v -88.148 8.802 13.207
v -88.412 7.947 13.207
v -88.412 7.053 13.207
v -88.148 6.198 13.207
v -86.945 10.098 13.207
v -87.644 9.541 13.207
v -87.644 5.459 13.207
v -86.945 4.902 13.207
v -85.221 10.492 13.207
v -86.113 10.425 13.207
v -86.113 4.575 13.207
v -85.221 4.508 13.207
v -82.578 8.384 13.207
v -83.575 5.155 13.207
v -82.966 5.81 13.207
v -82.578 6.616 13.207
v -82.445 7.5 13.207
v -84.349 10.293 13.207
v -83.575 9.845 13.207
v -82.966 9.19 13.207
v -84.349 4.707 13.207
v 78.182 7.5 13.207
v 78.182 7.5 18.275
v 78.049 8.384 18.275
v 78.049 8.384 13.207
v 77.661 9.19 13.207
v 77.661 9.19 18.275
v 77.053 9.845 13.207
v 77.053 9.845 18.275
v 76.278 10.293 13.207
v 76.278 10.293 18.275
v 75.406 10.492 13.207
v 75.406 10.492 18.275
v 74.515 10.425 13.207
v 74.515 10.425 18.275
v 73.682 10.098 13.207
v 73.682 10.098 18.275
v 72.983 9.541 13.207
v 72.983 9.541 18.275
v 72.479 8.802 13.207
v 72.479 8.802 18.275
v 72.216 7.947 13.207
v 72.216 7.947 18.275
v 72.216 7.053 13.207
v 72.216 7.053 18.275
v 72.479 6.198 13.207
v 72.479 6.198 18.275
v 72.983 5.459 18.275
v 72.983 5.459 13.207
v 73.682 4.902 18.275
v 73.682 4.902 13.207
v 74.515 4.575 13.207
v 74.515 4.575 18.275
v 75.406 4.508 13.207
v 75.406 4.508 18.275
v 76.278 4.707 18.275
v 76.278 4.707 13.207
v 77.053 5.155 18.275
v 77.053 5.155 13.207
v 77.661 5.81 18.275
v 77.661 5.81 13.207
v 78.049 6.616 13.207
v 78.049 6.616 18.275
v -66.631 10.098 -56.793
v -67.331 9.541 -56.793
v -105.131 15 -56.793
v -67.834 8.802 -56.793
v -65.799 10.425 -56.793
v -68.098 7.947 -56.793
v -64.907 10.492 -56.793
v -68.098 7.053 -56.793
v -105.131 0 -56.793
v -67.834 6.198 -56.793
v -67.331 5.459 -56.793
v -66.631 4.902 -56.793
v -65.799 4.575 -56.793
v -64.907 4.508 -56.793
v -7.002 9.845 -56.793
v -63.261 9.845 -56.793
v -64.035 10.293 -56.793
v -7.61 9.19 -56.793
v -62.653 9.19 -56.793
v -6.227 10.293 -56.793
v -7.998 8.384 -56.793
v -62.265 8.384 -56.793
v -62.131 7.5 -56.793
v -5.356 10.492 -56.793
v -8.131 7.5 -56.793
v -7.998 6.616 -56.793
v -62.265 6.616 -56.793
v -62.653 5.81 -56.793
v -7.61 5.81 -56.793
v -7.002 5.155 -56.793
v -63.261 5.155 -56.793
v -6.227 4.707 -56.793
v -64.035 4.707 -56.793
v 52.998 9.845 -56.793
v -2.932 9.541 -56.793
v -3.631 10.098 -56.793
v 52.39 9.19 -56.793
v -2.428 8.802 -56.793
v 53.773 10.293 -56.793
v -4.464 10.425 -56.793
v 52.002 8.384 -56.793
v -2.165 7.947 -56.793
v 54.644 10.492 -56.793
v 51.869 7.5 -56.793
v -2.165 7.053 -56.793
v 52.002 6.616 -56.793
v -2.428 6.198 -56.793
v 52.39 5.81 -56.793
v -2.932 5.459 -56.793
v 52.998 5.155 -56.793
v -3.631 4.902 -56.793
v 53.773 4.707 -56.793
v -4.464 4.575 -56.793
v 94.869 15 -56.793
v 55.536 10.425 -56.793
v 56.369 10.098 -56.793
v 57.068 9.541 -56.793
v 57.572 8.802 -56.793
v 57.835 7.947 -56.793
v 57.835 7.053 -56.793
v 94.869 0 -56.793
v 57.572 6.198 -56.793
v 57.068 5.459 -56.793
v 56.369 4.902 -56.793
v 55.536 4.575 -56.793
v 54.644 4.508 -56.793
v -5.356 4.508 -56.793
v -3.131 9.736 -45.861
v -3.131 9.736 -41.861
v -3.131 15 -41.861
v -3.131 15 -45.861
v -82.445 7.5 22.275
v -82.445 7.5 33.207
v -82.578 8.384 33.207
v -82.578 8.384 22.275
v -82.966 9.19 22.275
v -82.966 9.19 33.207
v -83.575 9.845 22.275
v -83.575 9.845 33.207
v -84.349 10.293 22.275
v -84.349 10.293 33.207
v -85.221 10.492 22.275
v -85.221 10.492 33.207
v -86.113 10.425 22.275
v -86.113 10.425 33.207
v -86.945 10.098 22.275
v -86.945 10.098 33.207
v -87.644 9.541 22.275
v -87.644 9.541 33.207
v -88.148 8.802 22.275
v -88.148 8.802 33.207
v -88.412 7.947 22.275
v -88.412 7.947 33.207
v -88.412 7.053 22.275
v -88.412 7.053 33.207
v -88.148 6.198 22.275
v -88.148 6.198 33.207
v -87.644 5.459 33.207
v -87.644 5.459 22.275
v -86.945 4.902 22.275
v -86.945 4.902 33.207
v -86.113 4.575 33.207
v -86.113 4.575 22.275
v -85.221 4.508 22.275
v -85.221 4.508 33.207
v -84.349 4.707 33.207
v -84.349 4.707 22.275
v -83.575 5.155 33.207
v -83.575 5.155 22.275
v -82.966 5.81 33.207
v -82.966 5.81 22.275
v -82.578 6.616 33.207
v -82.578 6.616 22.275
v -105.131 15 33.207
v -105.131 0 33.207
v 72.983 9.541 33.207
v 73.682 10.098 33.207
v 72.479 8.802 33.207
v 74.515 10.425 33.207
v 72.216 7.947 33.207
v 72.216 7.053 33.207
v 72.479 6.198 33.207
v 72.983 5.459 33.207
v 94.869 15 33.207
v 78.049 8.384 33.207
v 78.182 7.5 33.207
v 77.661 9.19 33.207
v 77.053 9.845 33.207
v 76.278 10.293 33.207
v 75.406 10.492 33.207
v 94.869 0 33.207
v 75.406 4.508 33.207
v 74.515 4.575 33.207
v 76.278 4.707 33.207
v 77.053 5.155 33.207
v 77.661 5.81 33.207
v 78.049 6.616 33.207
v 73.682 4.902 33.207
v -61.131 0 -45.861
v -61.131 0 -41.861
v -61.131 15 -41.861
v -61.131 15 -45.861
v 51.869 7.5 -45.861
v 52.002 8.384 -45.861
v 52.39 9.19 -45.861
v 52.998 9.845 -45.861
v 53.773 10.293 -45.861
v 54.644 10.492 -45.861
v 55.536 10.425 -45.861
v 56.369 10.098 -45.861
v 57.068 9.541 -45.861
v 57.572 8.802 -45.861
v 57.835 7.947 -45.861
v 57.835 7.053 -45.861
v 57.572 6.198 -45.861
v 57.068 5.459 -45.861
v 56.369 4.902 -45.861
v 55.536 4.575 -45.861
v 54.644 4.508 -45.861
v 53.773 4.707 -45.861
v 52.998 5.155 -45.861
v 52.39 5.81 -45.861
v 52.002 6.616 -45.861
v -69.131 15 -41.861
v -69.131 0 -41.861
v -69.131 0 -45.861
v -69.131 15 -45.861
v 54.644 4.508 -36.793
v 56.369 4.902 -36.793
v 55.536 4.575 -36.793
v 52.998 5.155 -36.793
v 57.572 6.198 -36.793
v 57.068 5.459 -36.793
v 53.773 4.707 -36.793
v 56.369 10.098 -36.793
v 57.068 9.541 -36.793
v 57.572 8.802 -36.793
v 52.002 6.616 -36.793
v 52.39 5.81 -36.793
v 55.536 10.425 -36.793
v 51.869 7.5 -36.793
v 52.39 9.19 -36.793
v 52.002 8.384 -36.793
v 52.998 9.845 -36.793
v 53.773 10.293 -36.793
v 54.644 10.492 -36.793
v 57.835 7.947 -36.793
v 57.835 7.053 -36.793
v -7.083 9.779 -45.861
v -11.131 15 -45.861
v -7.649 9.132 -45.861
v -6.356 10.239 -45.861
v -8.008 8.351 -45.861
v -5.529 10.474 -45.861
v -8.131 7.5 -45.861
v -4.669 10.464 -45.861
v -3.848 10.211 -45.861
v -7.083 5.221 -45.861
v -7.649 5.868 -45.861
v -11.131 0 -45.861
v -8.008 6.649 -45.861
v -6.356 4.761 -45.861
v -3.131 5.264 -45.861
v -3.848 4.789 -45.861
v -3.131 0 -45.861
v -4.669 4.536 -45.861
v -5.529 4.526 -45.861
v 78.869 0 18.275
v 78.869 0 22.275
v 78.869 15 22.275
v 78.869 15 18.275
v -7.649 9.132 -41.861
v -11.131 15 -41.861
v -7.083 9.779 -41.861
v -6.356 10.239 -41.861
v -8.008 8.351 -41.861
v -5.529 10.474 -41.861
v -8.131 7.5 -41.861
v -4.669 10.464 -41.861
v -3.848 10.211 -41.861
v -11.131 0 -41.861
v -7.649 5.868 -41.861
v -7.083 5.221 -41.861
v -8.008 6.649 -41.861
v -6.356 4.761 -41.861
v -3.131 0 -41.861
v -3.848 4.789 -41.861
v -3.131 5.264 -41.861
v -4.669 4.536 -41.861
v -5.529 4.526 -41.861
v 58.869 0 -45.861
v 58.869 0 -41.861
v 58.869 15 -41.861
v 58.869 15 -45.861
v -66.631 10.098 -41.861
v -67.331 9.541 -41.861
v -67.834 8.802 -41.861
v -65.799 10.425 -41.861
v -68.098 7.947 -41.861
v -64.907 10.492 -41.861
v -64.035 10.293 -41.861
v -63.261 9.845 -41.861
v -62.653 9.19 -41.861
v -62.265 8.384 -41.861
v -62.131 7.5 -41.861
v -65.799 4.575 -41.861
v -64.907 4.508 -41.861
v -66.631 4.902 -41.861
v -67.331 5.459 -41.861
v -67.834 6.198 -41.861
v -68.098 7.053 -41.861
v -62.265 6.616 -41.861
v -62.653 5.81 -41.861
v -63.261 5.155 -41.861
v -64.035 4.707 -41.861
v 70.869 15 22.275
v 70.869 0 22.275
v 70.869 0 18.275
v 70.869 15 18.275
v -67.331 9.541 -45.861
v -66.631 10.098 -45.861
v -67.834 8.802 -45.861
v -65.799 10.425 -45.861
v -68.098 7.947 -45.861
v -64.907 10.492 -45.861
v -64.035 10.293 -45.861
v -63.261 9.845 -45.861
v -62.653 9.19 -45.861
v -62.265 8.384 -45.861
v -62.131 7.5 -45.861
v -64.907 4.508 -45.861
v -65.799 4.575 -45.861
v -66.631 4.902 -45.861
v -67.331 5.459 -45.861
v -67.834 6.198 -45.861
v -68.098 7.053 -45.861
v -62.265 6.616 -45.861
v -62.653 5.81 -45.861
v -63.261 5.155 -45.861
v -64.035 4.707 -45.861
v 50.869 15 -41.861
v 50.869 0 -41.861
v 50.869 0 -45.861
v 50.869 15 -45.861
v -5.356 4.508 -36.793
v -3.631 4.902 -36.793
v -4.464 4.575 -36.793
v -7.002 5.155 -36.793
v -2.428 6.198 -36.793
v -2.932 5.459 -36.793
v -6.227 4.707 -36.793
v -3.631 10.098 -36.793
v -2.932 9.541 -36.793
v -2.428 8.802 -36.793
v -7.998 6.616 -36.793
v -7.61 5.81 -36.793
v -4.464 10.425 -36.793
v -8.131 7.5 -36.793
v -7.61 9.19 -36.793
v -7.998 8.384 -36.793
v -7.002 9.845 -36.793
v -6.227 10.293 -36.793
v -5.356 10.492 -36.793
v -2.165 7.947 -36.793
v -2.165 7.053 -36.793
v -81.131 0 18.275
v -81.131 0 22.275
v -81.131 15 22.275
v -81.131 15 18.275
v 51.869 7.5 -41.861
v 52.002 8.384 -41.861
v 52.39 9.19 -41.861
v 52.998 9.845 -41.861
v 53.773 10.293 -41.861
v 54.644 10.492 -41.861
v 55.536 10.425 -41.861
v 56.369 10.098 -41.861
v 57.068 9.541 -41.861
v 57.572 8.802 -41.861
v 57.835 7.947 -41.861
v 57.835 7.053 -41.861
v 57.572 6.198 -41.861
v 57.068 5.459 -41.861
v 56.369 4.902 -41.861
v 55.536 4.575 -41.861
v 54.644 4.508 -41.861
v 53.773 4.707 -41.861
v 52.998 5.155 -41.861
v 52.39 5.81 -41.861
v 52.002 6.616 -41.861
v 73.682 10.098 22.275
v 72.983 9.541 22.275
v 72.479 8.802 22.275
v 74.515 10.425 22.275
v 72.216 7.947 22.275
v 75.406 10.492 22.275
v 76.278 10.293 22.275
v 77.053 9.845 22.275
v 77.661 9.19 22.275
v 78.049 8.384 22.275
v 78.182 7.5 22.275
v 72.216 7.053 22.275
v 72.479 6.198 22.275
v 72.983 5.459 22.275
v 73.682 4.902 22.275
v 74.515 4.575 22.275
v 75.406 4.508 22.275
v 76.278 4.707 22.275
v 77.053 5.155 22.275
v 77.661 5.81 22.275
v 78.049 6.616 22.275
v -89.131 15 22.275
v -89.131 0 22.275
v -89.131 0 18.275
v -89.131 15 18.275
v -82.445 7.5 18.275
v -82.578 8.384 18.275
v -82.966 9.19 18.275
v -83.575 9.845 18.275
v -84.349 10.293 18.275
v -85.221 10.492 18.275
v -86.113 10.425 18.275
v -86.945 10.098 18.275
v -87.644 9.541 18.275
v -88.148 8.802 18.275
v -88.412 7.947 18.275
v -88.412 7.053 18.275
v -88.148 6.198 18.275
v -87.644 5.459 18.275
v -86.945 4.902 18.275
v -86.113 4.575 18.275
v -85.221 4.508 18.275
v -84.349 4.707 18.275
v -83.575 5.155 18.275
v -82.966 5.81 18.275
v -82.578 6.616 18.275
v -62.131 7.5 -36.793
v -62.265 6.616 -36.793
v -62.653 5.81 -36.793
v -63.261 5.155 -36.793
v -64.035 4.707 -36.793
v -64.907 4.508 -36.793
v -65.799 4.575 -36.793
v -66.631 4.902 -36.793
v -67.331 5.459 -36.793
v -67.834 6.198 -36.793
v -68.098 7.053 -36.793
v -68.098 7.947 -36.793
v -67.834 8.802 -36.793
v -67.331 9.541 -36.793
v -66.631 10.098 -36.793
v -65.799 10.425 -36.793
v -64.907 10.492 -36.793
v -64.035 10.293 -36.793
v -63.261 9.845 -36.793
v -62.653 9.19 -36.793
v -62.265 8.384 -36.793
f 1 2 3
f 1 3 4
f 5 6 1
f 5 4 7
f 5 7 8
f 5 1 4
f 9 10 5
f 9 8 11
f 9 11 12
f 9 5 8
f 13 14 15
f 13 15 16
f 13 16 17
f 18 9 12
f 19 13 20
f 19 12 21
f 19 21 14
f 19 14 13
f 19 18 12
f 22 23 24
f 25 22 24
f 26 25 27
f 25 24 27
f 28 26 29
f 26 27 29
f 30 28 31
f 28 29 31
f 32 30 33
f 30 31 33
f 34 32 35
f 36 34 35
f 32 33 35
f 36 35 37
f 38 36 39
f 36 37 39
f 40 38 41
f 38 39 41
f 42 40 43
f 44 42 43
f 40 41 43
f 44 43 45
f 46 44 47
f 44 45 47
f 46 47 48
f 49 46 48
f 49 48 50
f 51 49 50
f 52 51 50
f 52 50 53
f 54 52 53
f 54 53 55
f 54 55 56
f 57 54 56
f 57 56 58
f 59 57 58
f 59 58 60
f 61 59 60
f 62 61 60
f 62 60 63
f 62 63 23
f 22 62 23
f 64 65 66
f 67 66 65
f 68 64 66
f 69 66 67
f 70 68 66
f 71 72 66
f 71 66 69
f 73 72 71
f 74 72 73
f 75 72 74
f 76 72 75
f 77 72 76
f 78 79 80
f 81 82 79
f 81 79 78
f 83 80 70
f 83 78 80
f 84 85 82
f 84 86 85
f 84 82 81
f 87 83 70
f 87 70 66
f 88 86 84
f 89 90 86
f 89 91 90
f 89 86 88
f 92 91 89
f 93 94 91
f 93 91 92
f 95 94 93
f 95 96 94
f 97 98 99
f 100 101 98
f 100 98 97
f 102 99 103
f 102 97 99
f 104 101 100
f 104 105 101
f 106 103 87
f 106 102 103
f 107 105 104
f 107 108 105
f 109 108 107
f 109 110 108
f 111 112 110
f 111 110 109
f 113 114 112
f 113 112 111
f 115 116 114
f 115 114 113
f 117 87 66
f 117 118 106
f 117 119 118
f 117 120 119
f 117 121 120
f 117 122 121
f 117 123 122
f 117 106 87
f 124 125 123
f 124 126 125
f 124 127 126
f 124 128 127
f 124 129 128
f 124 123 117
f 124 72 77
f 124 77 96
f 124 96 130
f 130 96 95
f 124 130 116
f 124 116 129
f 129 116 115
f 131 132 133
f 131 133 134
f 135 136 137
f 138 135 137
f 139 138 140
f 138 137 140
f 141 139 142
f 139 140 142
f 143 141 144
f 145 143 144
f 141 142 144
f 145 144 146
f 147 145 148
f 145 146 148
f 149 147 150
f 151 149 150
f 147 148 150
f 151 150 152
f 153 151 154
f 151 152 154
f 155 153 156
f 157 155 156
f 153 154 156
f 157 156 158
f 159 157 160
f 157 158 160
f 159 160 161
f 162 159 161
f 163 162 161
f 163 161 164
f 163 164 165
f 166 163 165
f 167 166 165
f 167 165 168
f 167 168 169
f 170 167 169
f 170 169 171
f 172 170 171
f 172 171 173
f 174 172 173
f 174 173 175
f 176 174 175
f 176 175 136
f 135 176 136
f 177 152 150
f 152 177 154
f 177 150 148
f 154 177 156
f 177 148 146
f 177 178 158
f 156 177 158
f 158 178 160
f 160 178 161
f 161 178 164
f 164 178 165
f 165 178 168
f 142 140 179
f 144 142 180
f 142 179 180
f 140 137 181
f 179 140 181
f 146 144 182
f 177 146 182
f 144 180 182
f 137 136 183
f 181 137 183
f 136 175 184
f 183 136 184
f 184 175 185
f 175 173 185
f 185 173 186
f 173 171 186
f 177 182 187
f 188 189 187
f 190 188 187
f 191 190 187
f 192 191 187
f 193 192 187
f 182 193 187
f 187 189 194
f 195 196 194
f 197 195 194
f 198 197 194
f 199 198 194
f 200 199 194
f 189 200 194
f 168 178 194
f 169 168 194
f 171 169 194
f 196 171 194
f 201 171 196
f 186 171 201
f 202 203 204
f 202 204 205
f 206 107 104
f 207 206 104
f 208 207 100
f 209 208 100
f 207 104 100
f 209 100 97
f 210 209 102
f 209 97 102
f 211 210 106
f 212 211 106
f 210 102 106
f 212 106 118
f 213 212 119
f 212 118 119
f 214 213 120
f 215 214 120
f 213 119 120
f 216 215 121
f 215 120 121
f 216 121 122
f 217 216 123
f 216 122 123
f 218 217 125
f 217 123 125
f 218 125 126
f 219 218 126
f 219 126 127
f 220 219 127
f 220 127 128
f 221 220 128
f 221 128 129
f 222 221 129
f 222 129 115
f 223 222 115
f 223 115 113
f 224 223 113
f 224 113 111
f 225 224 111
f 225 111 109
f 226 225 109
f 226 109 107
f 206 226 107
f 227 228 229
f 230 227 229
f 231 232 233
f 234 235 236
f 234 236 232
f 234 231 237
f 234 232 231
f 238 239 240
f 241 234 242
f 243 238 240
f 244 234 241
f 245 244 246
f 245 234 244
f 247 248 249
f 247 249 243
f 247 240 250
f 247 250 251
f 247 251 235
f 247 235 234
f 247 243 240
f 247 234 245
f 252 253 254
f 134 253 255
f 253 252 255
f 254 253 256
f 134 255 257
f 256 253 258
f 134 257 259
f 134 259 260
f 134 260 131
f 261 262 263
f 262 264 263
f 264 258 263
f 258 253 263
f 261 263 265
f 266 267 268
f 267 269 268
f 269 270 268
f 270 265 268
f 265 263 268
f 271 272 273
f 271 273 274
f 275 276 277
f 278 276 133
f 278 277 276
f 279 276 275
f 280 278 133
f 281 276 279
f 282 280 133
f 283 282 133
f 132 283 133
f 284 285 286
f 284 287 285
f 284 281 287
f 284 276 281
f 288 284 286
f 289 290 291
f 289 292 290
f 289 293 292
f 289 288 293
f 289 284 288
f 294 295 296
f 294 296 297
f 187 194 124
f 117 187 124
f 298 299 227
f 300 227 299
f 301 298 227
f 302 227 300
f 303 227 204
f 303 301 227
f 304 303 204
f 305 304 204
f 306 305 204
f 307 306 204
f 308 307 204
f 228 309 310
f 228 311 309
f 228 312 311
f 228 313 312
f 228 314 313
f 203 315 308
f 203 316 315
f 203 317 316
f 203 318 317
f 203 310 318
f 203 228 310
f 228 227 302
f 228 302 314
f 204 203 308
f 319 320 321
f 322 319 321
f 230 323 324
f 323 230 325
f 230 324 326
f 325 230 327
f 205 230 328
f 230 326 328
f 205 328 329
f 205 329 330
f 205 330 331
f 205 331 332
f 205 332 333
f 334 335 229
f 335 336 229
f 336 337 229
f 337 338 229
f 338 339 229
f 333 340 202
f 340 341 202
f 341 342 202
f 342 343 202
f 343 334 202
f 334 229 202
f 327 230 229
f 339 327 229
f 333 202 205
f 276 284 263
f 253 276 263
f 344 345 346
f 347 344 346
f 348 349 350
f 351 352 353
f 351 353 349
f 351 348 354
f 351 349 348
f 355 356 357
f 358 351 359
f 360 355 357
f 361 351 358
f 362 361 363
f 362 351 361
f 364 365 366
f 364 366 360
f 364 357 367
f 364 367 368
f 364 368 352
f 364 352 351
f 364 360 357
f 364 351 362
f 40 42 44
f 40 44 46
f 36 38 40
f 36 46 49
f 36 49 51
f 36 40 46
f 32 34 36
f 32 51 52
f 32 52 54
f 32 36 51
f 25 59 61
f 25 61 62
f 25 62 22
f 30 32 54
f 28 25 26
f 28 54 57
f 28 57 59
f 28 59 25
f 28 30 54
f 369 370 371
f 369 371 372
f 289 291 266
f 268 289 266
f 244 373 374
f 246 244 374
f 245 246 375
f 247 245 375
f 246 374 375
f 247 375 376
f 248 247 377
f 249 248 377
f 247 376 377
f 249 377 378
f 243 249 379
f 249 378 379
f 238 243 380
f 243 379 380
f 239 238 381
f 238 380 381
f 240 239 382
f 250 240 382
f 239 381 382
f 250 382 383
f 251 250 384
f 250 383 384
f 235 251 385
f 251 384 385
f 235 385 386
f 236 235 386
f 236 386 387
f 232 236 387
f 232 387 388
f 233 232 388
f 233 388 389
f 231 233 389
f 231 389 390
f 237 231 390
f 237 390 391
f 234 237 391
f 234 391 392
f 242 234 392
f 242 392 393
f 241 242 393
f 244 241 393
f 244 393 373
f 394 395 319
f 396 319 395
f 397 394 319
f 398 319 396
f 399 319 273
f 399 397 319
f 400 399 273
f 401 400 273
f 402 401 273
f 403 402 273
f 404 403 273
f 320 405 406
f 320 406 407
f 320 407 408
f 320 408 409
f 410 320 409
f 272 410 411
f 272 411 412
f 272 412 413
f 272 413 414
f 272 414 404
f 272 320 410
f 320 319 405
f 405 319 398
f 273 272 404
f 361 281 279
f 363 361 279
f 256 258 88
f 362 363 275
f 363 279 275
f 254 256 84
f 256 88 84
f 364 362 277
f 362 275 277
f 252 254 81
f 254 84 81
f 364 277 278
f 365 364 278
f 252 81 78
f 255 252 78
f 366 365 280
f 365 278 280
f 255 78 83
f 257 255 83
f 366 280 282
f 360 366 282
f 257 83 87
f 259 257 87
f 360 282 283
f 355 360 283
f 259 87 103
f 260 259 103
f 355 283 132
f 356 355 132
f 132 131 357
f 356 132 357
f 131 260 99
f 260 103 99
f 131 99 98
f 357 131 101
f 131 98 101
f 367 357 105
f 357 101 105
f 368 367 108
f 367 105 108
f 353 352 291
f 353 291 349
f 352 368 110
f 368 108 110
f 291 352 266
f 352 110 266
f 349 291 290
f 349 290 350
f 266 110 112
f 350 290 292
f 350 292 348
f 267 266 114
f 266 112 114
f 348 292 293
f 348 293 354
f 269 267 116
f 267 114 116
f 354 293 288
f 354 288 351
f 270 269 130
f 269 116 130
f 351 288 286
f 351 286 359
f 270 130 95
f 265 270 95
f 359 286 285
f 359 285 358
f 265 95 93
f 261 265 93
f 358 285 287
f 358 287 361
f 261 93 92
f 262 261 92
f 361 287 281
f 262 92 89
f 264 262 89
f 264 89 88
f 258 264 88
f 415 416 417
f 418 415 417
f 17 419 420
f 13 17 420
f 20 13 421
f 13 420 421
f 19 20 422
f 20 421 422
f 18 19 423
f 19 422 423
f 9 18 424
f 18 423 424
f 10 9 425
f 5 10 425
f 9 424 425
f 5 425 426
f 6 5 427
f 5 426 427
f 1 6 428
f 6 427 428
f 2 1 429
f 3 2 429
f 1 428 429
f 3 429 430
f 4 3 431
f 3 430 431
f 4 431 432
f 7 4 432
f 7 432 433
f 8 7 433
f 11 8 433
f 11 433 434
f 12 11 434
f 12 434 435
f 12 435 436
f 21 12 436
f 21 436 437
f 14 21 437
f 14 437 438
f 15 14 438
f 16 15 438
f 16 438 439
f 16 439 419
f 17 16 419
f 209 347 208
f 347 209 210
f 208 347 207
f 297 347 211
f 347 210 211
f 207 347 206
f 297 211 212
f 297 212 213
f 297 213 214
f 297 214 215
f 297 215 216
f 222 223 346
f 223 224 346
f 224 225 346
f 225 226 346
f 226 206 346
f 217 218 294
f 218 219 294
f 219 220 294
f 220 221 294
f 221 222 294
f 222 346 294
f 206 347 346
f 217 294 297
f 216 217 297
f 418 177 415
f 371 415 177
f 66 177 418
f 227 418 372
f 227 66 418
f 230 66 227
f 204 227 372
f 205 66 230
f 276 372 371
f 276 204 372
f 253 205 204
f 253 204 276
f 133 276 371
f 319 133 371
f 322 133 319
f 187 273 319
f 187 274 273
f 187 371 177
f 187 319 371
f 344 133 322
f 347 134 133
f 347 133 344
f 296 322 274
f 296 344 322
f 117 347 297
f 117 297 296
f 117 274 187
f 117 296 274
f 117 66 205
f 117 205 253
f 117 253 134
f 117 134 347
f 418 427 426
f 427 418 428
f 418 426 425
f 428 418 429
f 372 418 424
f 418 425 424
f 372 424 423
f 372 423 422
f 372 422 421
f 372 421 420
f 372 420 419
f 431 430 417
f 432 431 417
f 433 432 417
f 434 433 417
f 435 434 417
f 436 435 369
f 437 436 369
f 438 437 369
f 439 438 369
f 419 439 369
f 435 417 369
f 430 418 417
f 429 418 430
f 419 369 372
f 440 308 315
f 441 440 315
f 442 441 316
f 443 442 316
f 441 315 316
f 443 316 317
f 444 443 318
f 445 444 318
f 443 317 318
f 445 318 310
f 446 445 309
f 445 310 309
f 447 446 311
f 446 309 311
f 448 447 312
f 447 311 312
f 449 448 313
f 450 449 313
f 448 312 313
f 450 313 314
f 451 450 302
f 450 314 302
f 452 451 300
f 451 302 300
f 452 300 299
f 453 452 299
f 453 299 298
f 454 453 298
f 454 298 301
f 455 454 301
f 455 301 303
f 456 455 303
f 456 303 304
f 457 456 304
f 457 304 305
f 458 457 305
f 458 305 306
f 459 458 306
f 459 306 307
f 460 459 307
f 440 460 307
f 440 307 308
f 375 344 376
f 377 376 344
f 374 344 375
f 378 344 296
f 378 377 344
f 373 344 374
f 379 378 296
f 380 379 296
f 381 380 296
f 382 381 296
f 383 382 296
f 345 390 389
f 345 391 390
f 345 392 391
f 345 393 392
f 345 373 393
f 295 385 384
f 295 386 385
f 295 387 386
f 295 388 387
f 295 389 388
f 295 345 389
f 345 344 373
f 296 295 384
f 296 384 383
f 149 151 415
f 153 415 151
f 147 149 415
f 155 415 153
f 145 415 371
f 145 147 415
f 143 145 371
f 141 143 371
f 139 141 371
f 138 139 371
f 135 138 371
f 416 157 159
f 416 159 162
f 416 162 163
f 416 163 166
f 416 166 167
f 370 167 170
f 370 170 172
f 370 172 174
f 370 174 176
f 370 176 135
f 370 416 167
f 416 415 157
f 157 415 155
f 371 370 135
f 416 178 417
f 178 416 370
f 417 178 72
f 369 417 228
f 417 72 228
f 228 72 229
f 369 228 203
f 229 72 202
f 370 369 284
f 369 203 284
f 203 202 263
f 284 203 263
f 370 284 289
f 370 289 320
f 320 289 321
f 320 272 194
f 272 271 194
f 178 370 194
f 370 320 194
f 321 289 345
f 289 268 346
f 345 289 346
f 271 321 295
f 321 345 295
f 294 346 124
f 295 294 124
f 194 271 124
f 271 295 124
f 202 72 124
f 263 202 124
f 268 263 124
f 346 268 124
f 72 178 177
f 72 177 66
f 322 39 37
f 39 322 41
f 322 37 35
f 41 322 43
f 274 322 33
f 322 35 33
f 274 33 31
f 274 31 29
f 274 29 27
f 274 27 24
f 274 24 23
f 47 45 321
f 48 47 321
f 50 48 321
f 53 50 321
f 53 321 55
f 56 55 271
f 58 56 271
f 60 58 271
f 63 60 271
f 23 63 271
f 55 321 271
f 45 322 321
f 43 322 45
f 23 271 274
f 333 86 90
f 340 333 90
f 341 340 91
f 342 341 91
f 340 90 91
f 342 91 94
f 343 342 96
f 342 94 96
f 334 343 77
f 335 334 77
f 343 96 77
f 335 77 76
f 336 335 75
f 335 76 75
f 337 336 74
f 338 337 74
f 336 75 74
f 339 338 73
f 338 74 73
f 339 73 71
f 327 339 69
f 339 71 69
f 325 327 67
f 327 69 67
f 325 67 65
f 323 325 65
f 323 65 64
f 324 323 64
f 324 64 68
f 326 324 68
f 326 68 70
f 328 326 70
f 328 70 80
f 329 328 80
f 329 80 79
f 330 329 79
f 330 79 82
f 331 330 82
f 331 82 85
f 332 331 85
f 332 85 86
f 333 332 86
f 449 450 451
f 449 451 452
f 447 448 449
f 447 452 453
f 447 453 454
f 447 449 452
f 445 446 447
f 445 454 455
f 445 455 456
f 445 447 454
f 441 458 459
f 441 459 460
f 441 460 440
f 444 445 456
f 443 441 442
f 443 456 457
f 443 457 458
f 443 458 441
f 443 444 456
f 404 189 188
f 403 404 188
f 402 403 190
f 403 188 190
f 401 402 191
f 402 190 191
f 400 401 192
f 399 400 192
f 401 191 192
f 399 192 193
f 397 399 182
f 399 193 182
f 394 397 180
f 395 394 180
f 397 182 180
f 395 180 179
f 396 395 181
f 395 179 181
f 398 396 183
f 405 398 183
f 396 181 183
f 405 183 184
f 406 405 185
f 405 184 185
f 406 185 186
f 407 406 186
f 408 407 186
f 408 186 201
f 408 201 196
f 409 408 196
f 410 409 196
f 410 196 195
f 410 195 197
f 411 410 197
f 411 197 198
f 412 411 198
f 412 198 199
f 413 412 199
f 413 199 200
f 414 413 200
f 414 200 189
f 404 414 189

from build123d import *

# Parameters (mm, degrees)
SKETCH1_W           = 200
SKETCH1_H           = 90
SKETCH1_W_2         = 8
SKETCH1_H_2         = 4
BOSS_EXTRUDE1_DEPTH = 15
SKETCH2_R           = 3
CUT_EXTRUDE1_DEPTH  = 20
SKETCH3_R           = 3
CUT_EXTRUDE2_DEPTH  = 20


with BuildPart() as part:
    # Sketch1 → Boss-Extrude1 (new body)
    with BuildSketch(Plane(origin=(0, 0, 0), x_dir=(1, 0, 0), z_dir=(0, 1, 0))):
        with Locations((-5.131403118, 11.792873051)):
            Rectangle(SKETCH1_W, SKETCH1_H)
        with Locations((54.868596882, 43.860843617)):
            Rectangle(SKETCH1_W_2, SKETCH1_H_2, mode=Mode.SUBTRACT)
        with Locations((-65.131403118, 43.860843617)):
            Rectangle(SKETCH1_W_2, SKETCH1_H_2, mode=Mode.SUBTRACT)
        with Locations((-7.131403118, 43.860843617)):
            Rectangle(SKETCH1_W_2, SKETCH1_H_2, mode=Mode.SUBTRACT)
        with Locations((74.868596882, -20.275097514)):
            Rectangle(SKETCH1_W_2, SKETCH1_H_2, mode=Mode.SUBTRACT)
        with Locations((-85.131403118, -20.275097514)):
            Rectangle(SKETCH1_W_2, SKETCH1_H_2, mode=Mode.SUBTRACT)
    extrude(amount=BOSS_EXTRUDE1_DEPTH)

    # Sketch2 → Cut-Extrude1 (cut)
    with BuildSketch(Plane(origin=(0, 0, -56.792873051), x_dir=(-1, 0, 0), z_dir=(0, 0, -1))):
        with Locations((-54.868596882, 7.5)):
            Circle(SKETCH2_R)
        with Locations((5.131403118, 7.5)):
            Circle(SKETCH2_R)
        with Locations(Location((65.131403118, 7.5, 0), (0, 0, 180))):
            Circle(SKETCH2_R)
    extrude(amount=-CUT_EXTRUDE1_DEPTH, mode=Mode.SUBTRACT)

    # Sketch3 → Cut-Extrude2 (cut)
    with BuildSketch(Plane.XY.offset(33.207126949)):
        with Locations((-85.445029849, 7.5)):
            Circle(SKETCH3_R)
        with Locations((75.182223613, 7.5)):
            Circle(SKETCH3_R)
    extrude(amount=-CUT_EXTRUDE2_DEPTH, mode=Mode.SUBTRACT)


solid = part.part
